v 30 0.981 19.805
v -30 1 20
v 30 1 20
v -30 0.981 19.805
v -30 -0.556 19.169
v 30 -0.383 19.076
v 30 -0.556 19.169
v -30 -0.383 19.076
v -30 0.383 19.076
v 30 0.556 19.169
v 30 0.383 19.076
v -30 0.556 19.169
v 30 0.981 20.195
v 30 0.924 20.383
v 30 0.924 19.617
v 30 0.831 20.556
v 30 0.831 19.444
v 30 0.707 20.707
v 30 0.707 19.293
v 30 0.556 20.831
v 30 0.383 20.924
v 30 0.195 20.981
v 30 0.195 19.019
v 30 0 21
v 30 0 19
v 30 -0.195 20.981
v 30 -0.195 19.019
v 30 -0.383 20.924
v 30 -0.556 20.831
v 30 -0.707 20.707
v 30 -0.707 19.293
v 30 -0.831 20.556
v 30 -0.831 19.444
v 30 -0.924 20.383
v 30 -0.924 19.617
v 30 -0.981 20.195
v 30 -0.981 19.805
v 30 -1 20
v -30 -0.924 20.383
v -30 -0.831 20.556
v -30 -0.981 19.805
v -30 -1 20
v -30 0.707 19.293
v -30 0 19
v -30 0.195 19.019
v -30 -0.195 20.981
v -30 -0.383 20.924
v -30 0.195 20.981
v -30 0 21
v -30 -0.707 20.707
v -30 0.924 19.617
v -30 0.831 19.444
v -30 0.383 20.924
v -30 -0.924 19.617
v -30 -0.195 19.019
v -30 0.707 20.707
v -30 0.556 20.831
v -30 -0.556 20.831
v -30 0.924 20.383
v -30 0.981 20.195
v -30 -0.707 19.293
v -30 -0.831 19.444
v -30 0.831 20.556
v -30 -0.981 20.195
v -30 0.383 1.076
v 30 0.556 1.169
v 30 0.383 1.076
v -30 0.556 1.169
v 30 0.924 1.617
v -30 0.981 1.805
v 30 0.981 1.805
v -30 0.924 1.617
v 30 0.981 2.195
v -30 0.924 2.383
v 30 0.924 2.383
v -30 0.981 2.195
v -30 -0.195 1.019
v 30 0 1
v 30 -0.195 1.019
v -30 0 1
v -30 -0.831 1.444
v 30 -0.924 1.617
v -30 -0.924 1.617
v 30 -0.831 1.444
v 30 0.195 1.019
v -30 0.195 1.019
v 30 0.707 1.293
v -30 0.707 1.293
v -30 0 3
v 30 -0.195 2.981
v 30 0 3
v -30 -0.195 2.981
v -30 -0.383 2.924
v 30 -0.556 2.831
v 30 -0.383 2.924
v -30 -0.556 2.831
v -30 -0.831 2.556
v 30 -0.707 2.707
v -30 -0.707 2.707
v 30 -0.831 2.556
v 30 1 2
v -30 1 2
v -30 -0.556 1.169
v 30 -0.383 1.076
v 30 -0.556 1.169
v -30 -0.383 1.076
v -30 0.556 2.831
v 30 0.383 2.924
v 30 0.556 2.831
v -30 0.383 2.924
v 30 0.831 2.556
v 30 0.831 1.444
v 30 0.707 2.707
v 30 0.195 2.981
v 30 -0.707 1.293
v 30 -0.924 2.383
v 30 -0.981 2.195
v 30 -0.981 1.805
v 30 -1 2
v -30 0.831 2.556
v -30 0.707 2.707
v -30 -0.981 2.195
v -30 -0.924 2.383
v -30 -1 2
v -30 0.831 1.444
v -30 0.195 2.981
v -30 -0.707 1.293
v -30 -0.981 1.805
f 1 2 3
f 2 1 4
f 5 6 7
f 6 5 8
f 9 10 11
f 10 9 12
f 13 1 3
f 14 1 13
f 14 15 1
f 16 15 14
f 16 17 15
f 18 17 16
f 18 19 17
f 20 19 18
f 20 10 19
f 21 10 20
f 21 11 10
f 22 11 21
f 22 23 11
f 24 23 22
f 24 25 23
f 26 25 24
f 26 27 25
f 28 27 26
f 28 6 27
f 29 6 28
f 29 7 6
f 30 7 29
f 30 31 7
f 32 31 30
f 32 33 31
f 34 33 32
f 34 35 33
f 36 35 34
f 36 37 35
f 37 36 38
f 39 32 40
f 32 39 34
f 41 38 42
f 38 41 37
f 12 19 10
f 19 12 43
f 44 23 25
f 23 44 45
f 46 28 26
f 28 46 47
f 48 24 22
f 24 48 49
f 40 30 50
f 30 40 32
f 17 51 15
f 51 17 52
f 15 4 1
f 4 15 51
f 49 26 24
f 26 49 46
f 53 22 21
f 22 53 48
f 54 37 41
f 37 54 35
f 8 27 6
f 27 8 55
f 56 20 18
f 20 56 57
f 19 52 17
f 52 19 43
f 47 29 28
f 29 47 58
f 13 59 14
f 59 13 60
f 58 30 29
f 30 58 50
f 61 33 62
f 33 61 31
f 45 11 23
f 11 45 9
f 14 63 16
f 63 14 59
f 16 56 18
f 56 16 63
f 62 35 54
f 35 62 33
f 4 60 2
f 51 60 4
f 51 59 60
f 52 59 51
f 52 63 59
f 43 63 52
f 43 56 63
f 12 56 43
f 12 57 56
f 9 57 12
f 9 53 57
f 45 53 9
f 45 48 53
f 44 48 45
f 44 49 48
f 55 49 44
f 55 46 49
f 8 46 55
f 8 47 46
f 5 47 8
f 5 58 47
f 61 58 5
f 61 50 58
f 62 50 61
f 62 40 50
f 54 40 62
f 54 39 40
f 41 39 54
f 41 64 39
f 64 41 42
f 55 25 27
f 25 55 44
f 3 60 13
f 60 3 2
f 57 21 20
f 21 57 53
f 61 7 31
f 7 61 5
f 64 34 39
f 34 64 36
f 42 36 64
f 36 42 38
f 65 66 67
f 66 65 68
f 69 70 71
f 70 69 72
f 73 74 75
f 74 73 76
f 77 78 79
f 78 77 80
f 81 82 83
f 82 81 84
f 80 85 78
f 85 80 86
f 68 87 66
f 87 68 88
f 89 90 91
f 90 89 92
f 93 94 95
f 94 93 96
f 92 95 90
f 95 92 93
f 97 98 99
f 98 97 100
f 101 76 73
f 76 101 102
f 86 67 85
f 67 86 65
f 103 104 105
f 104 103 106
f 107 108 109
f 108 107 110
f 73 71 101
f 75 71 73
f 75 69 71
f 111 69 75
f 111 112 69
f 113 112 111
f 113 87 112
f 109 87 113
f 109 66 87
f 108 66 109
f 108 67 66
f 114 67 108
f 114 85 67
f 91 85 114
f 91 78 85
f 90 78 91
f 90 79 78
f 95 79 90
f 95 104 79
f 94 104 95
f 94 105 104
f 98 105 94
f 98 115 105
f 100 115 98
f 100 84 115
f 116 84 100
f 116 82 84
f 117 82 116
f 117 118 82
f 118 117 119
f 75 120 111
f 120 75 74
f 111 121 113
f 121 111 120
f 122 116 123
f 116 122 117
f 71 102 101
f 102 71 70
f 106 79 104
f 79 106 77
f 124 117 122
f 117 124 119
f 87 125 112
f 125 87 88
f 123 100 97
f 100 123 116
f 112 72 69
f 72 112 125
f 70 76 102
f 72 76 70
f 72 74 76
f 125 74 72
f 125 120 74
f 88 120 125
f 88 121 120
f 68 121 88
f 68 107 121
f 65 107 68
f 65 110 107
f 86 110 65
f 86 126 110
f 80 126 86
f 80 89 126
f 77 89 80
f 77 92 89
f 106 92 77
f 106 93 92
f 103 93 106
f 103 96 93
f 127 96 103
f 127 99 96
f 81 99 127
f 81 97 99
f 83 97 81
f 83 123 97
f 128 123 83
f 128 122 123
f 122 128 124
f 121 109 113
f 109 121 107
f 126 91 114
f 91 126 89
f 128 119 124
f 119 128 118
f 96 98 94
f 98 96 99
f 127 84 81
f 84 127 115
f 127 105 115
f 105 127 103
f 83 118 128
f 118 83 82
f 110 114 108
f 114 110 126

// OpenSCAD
// file: leverArms.scad
use <presser.scad>

armsLen = 60;
distanceR = presser_getR() + 0.5;
profileR = 5;

function leverArms_getProfileR() =  profileR;
function leverArms_getDistanceR() = distanceR;



module leverArms_profile()
{
    circle(r = profileR, $fn = 6);
}

module leverArms()
{
    union()
    {
        translate([-(distanceR + profileR), 0, 0]) rotate([-90,0,0])  linear_extrude(    armsLen) leverArms_profile();
        translate([+(distanceR + profileR), 0, 0]) rotate([-90,0,0])  linear_extrude(    armsLen) leverArms_profile();
    }
}
leverArms();
// file: presser.scad
use <leverMounting.scad>


radious = 15;
thickness = 4;
height = 25;

function presser_getR() = radious;
function getPresserAng() = 2;

presser();
module presser()
{
    difference()
    {
        cylinder(h = height, r = radious, $fn =64);
        translate([0,0,-1])cylinder(h = height + 2, r = radious - thickness);
        
        mountingHoles(getPresserAng());
    }
    
}
// main file
use <presser.scad>
use <leverArms.scad>

mountingDistance = 18;
mountingBottomHoleCenter = 2;
function mountingHoles_getBottomPosition() = [0,0,mountingBottomHoleCenter];
function mountingHoles_getTopPosition() = [0,0,mountingBottomHoleCenter + mountingDistance];
presserR = presser_getR();
holeR = 1;


module mountingHoles(ang = 0)
{
    translate([0,0,mountingDistance/2 + mountingBottomHoleCenter]) rotate([ang,0,0])    union()
    {
        #translate([-presserR - 15, 0, mountingDistance / 2]) rotate([0, 90, 0]) cylinder(h = 2 * presserR + 30, r = holeR, $fn =32);
        #translate([-presserR - 15, 0, -mountingDistance / 2]) rotate([0, 90, 0]) cylinder(h = 2 * presserR + 30, r = holeR, $fn =32);
    }
    
}
mountingHoles();
